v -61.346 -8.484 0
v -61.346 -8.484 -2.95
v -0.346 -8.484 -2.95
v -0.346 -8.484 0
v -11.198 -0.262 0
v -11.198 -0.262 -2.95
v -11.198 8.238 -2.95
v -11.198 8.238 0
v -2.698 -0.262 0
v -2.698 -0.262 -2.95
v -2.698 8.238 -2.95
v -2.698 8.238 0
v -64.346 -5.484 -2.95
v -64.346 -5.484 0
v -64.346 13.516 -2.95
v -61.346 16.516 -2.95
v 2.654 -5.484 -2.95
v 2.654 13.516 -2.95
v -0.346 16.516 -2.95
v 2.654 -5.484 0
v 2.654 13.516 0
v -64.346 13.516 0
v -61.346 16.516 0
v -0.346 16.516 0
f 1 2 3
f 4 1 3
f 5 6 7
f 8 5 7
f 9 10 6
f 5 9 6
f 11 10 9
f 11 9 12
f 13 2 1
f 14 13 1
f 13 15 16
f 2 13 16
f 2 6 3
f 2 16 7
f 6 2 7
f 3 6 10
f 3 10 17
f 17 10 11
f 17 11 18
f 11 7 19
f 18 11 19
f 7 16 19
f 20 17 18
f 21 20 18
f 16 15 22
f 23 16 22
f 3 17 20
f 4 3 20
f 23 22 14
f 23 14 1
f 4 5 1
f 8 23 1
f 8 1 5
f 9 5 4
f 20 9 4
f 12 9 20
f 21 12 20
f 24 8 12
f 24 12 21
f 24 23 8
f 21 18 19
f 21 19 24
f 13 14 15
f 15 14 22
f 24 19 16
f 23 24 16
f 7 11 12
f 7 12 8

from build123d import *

# Parameters (mm, degrees)
SKETCH_1_W             = 84
SKETCH_1_H             = 55
SM_BASE_FLANGE_1_DEPTH = 2.95
SKETCH_5_W             = 8.5
SKETCH_5_H             = 8.5
CUT_EXTRUDE_1_DEPTH    = 10
CHAMFER_1_SIZE         = 3


# Sheet-metal steps are written as plain solids
with BuildPart() as part:
    # Sketch 1 → Базовая кромка1 (new body)
    with BuildSketch(Plane.XY):
        with Locations((-22.345696863, 3.516131621)):
            Rectangle(SKETCH_1_W, SKETCH_1_H)
    extrude(amount=-SM_BASE_FLANGE_1_DEPTH)

    # Эскиз5 → Вырез-Вытянуть1 (cut)
    with BuildSketch(Plane(origin=(0, 0, -2.95), x_dir=(-1, 0, 0), z_dir=(0, 0, -1))):
        Polygon((64.345696863, -23.983868379), (64.345696863, -8.483868379), (-2.654303137, -8.483868379), (-2.654303137, 16.516131621), (64.345696863, 16.516131621), (64.345696863, 31.016131621), (-19.654303137, 31.016131621), (-19.654303137, -23.983868379), align=None)
        with Locations((6.948166656, 3.987990807)):
            Rectangle(SKETCH_5_W, SKETCH_5_H)
    extrude(amount=-CUT_EXTRUDE_1_DEPTH, mode=Mode.SUBTRACT)

    # Фаска1
    chamfer_1_edges = [part.edges().sort_by_distance(p)[0] for p in [
        (2.654303137, 16.516131621, -1.475),
        (2.654303137, -8.483868379, -1.475),
        (-64.345696863, -8.483868379, -1.475),
        (-64.345696863, 16.516131621, -1.475),
    ]]
    chamfer(chamfer_1_edges, length=CHAMFER_1_SIZE)


solid = part.part
